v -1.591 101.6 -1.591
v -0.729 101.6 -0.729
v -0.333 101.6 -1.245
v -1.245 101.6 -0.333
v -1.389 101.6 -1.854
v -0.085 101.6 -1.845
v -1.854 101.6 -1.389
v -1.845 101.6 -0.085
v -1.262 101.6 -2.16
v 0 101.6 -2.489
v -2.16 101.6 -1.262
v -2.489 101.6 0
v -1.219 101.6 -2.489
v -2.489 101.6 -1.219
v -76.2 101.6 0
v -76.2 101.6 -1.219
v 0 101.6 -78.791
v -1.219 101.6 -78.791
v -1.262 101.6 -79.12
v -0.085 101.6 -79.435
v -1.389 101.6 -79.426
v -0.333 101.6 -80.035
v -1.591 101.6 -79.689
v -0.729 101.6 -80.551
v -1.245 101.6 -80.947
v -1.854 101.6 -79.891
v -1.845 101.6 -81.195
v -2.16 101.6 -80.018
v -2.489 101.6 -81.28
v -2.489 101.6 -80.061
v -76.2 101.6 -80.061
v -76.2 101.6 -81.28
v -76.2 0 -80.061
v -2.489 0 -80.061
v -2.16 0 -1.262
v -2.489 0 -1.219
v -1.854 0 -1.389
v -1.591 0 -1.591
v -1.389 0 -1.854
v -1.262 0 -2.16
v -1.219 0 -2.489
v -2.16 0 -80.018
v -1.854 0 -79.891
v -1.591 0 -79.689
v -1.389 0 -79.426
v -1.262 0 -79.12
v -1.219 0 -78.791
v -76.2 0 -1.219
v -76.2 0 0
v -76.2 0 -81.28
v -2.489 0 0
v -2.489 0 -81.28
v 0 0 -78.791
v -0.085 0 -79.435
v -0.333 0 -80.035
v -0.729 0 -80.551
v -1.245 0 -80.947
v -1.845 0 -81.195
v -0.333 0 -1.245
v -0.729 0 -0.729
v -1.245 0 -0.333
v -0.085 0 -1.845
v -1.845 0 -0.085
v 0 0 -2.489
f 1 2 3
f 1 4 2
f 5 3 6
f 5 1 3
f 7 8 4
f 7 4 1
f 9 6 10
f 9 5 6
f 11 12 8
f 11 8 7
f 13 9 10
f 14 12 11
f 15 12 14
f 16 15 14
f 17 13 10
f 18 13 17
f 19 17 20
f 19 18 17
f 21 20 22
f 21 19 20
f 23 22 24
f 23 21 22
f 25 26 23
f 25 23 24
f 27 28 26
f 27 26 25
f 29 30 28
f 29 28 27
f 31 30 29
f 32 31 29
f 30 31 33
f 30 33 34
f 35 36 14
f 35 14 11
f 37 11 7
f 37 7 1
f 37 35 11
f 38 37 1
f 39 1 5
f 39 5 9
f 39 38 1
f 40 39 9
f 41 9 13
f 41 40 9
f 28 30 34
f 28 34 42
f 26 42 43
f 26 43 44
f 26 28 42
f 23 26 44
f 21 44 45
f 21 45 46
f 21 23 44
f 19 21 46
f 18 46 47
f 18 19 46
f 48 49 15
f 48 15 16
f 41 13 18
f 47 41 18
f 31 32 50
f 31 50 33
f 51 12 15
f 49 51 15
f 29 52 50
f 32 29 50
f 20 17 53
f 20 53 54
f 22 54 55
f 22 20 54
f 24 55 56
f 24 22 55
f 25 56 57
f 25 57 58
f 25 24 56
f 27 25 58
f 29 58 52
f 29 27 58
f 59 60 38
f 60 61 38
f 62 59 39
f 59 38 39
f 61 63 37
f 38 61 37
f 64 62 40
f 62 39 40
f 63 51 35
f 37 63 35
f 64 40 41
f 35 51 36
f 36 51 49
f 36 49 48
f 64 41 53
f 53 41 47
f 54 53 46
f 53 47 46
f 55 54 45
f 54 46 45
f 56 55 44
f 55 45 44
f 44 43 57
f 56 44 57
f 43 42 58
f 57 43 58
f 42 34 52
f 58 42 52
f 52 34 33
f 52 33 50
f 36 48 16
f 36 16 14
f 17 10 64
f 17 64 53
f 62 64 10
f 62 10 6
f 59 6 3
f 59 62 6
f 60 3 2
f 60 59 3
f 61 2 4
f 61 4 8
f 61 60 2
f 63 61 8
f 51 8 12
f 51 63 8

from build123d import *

# Parameters (mm, degrees)
SKETCH1_W                    = 81.28
SKETCH1_H                    = 101.6
BASE_FLANGE1_DEPTH           = 1.2192
EDGE_FLANGE1_STRIP_W         = 7.4168
EDGE_FLANGE1_STRIP_H         = 1.2192
EDGE_FLANGE1_STRIP_CUT_DEPTH = 101.6
EDGE_FLANGE1_DEPTH           = 101.6
EDGE_FLANGE2_STRIP_W         = 7.4168
EDGE_FLANGE2_STRIP_H         = 1.2192
EDGE_FLANGE2_STRIP_CUT_DEPTH = 101.6
EDGE_FLANGE2_DEPTH           = 101.6


# Sheet-metal steps are written as plain solids
with BuildPart() as part:
    # Sketch1 → Base-Flange1 (new body)
    with BuildSketch(Plane(origin=(0, 0, 0), x_dir=(0, 0, -1), z_dir=(1, 0, 0))):
        with Locations((40.64, 50.8)):
            Rectangle(SKETCH1_W, SKETCH1_H)
    extrude(amount=-BASE_FLANGE1_DEPTH)

    # Edge-Flange1 strip (across the edge) → Edge-Flange1 strip cut (cut)
    with BuildSketch(Plane(origin=(-1.2192, 0, 0), x_dir=(0, 0, -1), z_dir=(0, 1, 0))):
        with Locations((-1.2192, -0.6096)):
            Rectangle(EDGE_FLANGE1_STRIP_W, EDGE_FLANGE1_STRIP_H)
    extrude(amount=EDGE_FLANGE1_STRIP_CUT_DEPTH, mode=Mode.SUBTRACT)

    # Edge-Flange1 section (across the edge) → Edge-Flange1 (add)
    with BuildSketch(Plane(origin=(-1.2192, 0, 0), x_dir=(0, 0, -1), z_dir=(0, 1, 0))):
        with BuildLine():
            Line((0, 1.27), (0, 74.9808))
            Line((0, 74.9808), (1.2192, 74.9808))
            Line((1.2192, 74.9808), (1.2192, 1.27))
            ThreePointArc((1.2192, 1.27), (1.591174388, 0.371974388), (2.4892, 0))
            Line((2.4892, 0), (2.4892, -1.2192))
            ThreePointArc((2.4892, -1.2192), (0.7290698, -0.4901302), (0, 1.27))
        make_face()
    extrude(amount=EDGE_FLANGE1_DEPTH)

    # Edge-Flange2 strip (across the edge) → Edge-Flange2 strip cut (cut)
    with BuildSketch(Plane(origin=(-1.2192, 101.6, -81.28), x_dir=(0, 0, 1), z_dir=(0, -1, 0))):
        with Locations((-1.2192, -0.6096)):
            Rectangle(EDGE_FLANGE2_STRIP_W, EDGE_FLANGE2_STRIP_H)
    extrude(amount=EDGE_FLANGE2_STRIP_CUT_DEPTH, mode=Mode.SUBTRACT)

    # Edge-Flange2 section (across the edge) → Edge-Flange2 (add)
    with BuildSketch(Plane(origin=(-1.2192, 101.6, -81.28), x_dir=(0, 0, 1), z_dir=(0, -1, 0))):
        with BuildLine():
            Line((0, 1.27), (0, 74.9808))
            Line((0, 74.9808), (1.2192, 74.9808))
            Line((1.2192, 74.9808), (1.2192, 1.27))
            ThreePointArc((1.2192, 1.27), (1.591174388, 0.371974388), (2.4892, 0))
            Line((2.4892, 0), (2.4892, -1.2192))
            ThreePointArc((2.4892, -1.2192), (0.7290698, -0.4901302), (0, 1.27))
        make_face()
    extrude(amount=EDGE_FLANGE2_DEPTH)


solid = part.part
